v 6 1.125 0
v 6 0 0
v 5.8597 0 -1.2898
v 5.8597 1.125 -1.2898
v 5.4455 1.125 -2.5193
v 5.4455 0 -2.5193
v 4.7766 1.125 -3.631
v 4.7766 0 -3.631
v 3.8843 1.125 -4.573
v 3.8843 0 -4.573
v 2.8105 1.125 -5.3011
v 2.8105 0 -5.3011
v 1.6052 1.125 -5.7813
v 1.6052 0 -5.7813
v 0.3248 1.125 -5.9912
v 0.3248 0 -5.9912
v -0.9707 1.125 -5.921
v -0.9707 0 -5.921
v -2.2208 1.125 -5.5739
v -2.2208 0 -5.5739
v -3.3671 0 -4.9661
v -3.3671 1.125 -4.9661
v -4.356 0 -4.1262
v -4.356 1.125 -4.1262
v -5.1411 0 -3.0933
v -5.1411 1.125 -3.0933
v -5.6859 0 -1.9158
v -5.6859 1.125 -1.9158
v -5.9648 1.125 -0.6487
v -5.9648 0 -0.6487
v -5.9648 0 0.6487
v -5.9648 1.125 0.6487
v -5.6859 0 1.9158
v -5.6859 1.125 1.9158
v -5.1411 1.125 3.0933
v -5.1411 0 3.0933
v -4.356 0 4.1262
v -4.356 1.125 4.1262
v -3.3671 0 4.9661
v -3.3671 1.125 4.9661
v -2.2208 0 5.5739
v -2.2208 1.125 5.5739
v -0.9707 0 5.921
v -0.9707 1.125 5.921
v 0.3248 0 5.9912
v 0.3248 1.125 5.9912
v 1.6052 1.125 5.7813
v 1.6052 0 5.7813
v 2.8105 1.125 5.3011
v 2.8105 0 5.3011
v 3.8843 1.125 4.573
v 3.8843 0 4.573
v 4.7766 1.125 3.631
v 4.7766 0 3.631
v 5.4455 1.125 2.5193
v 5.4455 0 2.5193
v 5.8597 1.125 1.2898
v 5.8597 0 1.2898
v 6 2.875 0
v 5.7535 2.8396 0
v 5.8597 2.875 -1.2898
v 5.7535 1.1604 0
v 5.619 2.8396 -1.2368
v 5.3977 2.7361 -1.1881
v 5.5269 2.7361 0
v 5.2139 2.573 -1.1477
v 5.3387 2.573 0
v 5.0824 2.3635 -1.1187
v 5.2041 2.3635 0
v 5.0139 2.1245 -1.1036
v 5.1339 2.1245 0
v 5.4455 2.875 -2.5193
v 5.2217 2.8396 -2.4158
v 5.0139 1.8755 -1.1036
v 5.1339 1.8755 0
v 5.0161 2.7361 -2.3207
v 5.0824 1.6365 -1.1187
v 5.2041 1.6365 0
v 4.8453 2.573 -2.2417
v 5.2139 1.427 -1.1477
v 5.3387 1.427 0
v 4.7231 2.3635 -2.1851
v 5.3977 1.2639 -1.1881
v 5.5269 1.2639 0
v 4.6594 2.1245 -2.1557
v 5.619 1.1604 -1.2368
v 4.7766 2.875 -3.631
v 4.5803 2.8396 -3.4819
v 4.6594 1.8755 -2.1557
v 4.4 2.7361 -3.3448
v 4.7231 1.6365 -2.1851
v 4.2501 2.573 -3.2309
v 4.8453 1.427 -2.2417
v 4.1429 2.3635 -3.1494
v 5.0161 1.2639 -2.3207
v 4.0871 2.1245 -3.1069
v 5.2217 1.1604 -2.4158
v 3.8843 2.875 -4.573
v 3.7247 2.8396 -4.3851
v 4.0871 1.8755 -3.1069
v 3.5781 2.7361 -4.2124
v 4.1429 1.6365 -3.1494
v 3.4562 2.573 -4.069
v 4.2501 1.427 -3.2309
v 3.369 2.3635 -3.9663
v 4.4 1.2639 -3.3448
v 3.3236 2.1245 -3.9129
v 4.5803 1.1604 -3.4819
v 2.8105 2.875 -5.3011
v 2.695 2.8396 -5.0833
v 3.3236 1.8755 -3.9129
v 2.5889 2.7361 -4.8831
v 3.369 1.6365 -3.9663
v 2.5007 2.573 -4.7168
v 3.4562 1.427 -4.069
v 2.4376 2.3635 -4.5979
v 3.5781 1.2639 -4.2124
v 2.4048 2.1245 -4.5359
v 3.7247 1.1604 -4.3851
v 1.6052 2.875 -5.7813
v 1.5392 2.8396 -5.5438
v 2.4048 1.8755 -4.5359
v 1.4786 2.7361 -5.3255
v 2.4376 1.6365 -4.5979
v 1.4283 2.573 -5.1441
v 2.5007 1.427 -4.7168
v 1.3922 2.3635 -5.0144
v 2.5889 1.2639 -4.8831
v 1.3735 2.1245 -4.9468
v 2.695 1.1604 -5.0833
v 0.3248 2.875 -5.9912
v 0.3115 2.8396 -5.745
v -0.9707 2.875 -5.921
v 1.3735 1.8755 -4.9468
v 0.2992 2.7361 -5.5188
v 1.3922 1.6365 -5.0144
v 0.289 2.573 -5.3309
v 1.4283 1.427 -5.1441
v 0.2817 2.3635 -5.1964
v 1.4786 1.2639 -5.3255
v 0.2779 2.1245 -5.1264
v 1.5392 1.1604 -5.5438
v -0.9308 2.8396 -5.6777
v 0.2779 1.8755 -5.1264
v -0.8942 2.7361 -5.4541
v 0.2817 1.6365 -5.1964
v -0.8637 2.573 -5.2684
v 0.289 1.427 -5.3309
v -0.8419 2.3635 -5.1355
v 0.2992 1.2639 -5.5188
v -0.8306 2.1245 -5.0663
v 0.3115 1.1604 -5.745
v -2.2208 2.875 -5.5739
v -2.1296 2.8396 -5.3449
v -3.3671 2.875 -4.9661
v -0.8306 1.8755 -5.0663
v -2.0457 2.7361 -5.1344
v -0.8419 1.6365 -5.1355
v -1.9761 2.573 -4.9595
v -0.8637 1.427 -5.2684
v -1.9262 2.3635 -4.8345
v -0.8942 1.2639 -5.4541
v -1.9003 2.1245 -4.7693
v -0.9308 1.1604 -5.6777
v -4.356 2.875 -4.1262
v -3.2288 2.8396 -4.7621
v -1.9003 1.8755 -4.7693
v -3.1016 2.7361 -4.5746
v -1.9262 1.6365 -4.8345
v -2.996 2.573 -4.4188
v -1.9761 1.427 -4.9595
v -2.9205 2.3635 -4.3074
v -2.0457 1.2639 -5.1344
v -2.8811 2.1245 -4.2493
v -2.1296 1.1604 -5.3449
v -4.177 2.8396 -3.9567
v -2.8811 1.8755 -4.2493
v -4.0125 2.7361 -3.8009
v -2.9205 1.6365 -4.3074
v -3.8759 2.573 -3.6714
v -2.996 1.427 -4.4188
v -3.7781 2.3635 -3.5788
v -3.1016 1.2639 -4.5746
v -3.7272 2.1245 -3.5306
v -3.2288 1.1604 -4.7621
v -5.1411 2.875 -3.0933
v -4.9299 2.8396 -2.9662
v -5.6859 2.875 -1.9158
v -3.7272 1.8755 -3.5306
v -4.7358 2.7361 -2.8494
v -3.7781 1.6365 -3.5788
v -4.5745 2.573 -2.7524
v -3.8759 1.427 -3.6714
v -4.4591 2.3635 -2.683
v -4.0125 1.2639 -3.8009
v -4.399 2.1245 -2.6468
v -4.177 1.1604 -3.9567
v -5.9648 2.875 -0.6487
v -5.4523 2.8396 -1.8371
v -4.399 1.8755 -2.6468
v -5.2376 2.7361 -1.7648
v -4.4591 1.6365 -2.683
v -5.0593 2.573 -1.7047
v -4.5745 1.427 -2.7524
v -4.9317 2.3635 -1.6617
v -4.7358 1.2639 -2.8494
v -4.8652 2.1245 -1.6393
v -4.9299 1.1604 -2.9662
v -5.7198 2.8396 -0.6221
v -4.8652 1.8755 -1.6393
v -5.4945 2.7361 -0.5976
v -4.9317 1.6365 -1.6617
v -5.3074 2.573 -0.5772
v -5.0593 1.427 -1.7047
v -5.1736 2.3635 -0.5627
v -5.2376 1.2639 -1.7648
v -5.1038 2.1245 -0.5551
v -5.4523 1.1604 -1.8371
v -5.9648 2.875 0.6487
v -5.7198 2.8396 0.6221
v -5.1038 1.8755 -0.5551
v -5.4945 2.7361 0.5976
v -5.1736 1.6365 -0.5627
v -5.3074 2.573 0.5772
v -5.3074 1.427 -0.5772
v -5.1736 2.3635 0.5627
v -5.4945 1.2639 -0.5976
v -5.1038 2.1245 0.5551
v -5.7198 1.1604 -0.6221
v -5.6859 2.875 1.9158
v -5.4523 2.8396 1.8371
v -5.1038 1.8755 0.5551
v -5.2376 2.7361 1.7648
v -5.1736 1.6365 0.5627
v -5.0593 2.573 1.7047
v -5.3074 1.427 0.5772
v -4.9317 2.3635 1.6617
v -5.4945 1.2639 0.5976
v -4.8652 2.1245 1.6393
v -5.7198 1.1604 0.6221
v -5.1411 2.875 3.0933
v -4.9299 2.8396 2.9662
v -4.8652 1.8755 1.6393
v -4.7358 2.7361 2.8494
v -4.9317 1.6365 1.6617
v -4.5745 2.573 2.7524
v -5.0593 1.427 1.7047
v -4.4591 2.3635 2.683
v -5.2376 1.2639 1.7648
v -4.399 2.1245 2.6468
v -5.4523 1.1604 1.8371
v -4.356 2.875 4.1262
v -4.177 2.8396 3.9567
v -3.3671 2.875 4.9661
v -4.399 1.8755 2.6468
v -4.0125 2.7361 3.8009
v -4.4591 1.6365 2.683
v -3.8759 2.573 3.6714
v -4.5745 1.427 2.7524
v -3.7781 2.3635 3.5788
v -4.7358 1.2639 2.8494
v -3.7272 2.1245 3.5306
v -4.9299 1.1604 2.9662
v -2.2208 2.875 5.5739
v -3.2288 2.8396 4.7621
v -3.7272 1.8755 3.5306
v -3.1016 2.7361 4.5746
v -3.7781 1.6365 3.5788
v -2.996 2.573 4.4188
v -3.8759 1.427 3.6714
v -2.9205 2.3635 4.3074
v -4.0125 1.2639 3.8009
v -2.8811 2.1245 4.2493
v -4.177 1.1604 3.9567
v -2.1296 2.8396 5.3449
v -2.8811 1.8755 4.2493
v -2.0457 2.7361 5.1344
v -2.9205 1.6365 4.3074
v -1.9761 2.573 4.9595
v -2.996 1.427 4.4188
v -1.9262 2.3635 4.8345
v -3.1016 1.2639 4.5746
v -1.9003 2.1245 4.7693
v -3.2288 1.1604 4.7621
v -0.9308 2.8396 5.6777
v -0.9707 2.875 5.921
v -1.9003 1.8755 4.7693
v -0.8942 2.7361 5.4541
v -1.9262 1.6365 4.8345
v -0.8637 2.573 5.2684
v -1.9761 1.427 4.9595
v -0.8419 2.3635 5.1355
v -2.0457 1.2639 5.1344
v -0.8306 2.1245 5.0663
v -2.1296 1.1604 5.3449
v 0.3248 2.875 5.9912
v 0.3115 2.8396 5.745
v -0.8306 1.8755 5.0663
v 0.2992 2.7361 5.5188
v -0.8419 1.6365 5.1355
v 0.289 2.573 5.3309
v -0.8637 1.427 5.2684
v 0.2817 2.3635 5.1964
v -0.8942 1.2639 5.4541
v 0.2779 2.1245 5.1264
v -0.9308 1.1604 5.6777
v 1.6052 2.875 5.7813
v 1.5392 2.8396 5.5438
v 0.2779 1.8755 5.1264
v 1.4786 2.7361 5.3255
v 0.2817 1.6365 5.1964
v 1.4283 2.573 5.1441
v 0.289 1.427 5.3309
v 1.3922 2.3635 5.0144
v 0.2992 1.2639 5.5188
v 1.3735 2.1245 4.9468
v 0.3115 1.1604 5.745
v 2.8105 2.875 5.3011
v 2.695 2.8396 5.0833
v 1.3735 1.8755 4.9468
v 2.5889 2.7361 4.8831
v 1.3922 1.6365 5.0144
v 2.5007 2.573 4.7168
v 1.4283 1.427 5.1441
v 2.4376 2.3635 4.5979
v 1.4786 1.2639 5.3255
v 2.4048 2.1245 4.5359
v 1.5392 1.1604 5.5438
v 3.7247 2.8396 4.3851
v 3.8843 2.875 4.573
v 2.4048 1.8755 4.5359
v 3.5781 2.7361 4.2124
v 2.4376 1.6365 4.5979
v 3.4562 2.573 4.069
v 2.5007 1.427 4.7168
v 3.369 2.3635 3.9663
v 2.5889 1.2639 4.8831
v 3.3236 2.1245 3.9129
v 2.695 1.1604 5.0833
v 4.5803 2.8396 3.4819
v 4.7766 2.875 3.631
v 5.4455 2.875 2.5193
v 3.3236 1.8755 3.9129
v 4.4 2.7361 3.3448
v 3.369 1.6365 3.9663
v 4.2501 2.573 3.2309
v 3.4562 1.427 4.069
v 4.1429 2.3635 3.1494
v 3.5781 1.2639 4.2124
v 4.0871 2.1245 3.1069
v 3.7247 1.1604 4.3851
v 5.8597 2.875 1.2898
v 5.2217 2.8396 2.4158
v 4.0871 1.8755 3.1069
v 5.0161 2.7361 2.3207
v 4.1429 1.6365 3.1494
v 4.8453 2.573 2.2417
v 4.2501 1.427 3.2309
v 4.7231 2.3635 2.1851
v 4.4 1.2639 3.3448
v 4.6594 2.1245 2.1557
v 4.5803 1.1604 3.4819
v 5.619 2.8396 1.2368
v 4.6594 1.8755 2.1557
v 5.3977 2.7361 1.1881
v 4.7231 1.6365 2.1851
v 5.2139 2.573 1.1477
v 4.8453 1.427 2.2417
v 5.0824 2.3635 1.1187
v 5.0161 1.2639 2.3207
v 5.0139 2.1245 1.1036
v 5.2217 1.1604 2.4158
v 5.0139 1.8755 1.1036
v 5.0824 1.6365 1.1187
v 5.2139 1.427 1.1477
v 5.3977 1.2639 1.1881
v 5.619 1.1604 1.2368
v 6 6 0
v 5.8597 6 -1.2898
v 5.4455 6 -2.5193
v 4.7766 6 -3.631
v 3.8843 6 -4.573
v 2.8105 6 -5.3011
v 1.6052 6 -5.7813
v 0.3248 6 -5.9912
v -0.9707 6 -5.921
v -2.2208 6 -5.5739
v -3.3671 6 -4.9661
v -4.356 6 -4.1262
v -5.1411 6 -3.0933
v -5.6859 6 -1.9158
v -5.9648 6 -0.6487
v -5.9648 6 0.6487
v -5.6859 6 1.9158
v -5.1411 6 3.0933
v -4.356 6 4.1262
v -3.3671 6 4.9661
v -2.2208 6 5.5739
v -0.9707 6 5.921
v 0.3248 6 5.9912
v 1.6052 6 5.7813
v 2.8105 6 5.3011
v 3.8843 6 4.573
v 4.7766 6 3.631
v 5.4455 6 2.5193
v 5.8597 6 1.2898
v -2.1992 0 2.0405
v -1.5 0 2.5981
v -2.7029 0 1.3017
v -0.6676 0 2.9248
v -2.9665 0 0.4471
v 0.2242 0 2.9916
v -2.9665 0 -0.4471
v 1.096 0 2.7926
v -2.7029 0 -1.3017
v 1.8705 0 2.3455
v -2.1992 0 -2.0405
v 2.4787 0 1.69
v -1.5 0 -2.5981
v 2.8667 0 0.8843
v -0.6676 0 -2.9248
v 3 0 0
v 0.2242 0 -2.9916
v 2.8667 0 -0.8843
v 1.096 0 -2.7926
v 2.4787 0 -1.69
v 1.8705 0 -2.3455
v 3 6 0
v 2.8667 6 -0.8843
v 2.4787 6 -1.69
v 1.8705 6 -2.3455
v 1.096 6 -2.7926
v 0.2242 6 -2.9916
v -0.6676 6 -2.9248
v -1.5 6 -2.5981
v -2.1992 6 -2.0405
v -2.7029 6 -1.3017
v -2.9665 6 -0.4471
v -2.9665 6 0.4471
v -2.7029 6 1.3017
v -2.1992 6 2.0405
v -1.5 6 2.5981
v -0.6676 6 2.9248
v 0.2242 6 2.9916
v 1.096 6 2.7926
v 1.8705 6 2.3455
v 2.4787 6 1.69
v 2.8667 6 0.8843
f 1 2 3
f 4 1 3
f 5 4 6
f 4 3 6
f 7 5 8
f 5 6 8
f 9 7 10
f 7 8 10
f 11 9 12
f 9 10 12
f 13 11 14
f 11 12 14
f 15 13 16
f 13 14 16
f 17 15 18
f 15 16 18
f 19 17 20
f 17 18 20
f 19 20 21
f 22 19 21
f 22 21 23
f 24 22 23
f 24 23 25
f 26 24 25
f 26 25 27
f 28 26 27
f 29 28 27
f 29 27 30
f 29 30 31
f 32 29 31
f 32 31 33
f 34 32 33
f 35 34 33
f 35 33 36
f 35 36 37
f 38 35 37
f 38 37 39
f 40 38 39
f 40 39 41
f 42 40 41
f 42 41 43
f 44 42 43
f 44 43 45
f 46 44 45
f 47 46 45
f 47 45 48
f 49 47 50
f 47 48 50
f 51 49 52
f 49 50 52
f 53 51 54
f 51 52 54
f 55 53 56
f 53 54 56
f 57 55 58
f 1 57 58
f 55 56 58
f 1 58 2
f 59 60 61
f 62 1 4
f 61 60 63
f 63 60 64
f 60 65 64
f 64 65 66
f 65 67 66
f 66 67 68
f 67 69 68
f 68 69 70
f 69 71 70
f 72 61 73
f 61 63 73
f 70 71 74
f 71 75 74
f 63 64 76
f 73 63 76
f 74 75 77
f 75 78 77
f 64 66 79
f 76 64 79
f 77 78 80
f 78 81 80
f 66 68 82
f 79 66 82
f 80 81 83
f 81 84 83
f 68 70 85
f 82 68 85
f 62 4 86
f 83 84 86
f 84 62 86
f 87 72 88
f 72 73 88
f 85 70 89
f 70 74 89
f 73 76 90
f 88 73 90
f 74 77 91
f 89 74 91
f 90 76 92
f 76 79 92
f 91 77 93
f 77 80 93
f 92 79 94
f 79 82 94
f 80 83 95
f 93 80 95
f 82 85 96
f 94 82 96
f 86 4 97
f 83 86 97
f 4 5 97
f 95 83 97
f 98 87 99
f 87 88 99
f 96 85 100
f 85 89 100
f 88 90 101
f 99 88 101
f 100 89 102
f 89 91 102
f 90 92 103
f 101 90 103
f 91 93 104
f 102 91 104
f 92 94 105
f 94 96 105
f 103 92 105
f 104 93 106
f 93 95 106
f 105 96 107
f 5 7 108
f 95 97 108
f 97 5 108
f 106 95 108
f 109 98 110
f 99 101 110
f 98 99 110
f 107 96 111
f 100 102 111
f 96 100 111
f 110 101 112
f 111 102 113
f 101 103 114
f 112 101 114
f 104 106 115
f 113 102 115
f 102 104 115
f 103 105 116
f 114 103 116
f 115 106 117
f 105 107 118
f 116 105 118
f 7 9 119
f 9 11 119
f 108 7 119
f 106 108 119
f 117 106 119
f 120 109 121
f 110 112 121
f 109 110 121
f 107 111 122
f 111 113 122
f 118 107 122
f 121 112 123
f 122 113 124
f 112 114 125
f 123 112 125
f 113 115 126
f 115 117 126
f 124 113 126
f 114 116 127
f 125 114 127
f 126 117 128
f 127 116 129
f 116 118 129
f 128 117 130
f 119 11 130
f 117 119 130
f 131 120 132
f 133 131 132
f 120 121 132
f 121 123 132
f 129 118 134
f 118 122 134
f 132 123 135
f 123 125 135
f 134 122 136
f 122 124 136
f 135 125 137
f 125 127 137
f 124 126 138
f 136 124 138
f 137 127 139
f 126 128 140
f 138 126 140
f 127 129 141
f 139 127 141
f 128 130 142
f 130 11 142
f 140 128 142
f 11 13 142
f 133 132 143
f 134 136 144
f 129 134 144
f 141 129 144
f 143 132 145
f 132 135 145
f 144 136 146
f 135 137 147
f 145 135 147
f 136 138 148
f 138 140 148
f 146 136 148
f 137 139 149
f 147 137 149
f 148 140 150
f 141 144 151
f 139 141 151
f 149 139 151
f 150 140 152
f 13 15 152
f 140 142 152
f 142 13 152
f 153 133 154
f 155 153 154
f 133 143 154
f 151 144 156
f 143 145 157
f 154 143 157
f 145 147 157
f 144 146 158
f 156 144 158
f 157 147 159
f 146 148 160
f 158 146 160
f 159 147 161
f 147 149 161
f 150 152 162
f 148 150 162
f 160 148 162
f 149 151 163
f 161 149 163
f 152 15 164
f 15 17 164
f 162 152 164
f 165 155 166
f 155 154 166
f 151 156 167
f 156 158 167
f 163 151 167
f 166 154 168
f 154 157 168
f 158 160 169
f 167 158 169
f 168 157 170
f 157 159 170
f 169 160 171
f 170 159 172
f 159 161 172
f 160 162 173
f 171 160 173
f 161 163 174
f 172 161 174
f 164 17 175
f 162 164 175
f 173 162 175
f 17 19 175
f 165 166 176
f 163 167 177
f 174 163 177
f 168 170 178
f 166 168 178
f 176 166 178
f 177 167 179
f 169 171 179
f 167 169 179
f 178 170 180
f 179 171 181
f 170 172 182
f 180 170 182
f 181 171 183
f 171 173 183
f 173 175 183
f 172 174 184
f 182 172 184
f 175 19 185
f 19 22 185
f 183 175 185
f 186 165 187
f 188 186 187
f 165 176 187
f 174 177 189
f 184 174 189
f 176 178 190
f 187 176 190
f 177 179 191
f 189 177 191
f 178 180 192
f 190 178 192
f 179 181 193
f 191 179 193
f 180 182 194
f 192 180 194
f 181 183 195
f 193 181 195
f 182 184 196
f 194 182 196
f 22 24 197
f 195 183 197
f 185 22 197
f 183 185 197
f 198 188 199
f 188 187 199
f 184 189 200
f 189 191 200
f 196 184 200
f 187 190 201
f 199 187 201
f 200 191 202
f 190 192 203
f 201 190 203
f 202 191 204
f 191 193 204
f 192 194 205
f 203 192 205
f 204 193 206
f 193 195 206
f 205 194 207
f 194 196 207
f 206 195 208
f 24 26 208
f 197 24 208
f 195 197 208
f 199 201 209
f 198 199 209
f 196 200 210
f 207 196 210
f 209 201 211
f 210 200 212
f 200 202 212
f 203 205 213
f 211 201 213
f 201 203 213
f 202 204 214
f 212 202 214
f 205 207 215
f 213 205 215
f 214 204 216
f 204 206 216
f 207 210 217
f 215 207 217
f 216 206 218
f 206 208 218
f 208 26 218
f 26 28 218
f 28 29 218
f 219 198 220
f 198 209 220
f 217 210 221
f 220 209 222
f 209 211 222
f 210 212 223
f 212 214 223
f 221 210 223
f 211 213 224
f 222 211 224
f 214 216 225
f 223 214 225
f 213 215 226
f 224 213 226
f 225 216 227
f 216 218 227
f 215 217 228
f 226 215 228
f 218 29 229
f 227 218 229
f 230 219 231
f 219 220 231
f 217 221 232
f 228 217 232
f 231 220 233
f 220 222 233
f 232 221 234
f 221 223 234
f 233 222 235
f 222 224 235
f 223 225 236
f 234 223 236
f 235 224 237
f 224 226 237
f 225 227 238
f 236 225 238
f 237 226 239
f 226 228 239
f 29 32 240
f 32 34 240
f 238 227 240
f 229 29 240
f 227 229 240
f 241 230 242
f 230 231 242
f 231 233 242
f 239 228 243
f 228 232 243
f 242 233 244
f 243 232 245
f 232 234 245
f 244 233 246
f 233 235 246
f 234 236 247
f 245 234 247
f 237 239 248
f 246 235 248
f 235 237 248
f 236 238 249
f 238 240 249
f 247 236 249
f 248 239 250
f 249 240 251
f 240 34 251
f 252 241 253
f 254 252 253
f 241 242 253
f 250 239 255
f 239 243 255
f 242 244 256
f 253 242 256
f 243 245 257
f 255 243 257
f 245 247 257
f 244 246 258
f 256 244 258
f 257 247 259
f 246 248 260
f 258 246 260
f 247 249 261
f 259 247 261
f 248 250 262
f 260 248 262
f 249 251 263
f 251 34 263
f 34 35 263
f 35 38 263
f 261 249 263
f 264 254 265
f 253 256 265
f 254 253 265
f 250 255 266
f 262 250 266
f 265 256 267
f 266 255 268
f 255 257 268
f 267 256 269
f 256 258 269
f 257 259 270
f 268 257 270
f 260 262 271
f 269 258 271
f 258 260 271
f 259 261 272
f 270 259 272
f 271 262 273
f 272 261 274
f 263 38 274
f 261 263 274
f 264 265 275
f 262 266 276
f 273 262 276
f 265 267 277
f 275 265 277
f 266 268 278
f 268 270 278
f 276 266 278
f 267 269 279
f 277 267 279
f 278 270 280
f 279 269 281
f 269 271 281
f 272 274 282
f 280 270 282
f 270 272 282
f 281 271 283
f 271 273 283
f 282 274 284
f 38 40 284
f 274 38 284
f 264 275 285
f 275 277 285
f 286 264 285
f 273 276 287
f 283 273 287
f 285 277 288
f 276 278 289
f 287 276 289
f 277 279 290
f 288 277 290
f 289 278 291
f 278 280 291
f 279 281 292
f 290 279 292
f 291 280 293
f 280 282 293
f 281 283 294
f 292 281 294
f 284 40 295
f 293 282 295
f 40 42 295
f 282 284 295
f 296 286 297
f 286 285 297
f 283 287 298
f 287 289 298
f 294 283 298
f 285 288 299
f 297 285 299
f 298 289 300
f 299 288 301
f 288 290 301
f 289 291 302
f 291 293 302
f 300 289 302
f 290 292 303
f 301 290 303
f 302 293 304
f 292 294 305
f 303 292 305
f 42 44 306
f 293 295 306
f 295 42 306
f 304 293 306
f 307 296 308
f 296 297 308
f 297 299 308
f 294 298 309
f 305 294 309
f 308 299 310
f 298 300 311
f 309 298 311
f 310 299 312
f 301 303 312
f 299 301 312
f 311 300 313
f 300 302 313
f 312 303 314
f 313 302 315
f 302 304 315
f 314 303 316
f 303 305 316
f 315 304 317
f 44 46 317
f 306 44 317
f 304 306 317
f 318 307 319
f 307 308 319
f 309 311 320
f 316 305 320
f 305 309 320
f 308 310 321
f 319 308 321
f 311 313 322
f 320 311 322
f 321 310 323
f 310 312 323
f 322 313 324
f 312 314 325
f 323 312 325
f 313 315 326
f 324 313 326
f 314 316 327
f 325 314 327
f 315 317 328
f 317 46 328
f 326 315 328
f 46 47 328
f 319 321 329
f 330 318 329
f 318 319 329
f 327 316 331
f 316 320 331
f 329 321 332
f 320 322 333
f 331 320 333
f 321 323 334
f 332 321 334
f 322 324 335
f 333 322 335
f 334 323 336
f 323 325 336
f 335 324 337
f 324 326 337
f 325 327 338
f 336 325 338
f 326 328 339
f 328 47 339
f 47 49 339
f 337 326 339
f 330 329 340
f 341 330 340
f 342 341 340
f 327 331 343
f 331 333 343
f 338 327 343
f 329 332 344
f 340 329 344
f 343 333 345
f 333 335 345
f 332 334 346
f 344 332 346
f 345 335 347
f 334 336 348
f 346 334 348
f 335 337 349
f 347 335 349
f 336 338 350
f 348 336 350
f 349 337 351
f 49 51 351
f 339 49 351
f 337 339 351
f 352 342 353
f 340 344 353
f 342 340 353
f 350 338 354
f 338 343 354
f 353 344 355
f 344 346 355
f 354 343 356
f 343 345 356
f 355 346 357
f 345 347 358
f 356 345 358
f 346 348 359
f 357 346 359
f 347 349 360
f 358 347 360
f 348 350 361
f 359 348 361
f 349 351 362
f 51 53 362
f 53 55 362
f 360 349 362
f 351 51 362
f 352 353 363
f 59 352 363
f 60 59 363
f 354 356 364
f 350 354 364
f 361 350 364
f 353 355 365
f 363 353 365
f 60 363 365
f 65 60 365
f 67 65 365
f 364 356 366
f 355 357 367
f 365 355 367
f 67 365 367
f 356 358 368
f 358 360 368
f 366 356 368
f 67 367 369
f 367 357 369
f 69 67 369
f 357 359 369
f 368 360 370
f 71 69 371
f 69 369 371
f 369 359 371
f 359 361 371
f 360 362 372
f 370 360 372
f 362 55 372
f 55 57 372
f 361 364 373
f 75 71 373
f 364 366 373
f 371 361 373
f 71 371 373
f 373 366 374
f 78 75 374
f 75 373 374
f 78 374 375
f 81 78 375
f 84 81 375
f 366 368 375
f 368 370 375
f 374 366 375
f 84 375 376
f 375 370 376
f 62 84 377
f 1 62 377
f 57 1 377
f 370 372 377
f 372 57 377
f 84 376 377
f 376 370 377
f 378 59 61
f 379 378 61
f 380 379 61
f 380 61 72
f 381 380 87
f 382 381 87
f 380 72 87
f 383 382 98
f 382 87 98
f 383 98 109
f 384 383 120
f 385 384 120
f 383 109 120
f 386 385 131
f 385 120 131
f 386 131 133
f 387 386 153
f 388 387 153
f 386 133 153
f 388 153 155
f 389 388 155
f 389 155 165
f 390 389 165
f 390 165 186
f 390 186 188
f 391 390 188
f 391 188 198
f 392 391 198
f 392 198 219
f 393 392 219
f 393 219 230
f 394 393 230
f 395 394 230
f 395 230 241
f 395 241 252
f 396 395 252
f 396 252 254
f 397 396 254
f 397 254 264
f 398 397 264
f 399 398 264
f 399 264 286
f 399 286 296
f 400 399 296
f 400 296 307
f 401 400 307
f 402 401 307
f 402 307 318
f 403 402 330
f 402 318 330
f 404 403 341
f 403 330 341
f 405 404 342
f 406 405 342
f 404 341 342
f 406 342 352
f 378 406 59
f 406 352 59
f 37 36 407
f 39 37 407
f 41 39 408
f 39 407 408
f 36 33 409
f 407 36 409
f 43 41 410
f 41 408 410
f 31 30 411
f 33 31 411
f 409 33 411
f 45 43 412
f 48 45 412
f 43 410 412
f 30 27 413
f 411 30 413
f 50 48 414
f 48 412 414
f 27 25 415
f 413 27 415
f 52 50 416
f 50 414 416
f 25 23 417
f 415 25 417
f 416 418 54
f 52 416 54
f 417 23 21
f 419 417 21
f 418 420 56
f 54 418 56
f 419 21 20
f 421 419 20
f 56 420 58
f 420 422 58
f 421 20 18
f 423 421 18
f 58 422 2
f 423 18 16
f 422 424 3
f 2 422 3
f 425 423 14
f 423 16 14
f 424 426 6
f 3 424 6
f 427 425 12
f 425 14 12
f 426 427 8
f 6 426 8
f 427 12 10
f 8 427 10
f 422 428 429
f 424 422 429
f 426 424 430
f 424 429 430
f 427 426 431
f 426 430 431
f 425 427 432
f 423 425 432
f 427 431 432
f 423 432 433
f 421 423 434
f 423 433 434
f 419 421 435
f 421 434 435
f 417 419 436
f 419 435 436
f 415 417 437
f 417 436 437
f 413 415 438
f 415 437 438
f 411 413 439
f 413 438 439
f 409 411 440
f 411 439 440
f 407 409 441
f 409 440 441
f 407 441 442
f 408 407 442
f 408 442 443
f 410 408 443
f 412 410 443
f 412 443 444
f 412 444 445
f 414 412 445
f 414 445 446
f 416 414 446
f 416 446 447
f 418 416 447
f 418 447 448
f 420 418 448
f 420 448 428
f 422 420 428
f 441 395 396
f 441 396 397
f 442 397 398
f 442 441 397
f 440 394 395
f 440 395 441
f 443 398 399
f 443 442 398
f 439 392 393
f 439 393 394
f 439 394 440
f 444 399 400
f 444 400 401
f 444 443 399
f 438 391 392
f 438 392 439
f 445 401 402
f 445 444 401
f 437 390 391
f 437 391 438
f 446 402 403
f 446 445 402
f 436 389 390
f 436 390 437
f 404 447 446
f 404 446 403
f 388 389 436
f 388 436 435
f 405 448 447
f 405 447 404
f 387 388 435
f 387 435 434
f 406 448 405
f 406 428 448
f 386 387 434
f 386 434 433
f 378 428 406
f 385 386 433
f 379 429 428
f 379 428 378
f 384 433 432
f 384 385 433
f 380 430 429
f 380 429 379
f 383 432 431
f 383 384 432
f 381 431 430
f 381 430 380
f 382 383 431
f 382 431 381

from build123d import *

# Parameters (mm, degrees)
SKETCH1_R           = 6
BOSS_EXTRUDE1_DEPTH = 6
SKETCH2_R           = 0.875
SKETCH4_R           = 3.000001976
CUT_EXTRUDE1_DEPTH  = 8


with BuildPart() as part:
    # Sketch1 → Boss-Extrude1 (new body)
    with BuildSketch(Plane(origin=(0, 0, 0), x_dir=(1, 0, 0), z_dir=(0, 1, 0))):
        Circle(SKETCH1_R)
    extrude(amount=BOSS_EXTRUDE1_DEPTH)

    # Sketch2 → Cut-Revolve1 (revolve, cut)
    with BuildSketch(Plane.XY):
        with Locations((6, 2)):
            Circle(SKETCH2_R)
    revolve(axis=Axis((0, 0, 0), (0, 1, 0)), mode=Mode.SUBTRACT)

    # Sketch4 → Cut-Extrude1 (cut)
    with BuildSketch(Plane(origin=(0, 6, 0), x_dir=(1, 0, 0), z_dir=(0, 1, 0))):
        Circle(SKETCH4_R)
    extrude(amount=-CUT_EXTRUDE1_DEPTH, mode=Mode.SUBTRACT)


solid = part.part
